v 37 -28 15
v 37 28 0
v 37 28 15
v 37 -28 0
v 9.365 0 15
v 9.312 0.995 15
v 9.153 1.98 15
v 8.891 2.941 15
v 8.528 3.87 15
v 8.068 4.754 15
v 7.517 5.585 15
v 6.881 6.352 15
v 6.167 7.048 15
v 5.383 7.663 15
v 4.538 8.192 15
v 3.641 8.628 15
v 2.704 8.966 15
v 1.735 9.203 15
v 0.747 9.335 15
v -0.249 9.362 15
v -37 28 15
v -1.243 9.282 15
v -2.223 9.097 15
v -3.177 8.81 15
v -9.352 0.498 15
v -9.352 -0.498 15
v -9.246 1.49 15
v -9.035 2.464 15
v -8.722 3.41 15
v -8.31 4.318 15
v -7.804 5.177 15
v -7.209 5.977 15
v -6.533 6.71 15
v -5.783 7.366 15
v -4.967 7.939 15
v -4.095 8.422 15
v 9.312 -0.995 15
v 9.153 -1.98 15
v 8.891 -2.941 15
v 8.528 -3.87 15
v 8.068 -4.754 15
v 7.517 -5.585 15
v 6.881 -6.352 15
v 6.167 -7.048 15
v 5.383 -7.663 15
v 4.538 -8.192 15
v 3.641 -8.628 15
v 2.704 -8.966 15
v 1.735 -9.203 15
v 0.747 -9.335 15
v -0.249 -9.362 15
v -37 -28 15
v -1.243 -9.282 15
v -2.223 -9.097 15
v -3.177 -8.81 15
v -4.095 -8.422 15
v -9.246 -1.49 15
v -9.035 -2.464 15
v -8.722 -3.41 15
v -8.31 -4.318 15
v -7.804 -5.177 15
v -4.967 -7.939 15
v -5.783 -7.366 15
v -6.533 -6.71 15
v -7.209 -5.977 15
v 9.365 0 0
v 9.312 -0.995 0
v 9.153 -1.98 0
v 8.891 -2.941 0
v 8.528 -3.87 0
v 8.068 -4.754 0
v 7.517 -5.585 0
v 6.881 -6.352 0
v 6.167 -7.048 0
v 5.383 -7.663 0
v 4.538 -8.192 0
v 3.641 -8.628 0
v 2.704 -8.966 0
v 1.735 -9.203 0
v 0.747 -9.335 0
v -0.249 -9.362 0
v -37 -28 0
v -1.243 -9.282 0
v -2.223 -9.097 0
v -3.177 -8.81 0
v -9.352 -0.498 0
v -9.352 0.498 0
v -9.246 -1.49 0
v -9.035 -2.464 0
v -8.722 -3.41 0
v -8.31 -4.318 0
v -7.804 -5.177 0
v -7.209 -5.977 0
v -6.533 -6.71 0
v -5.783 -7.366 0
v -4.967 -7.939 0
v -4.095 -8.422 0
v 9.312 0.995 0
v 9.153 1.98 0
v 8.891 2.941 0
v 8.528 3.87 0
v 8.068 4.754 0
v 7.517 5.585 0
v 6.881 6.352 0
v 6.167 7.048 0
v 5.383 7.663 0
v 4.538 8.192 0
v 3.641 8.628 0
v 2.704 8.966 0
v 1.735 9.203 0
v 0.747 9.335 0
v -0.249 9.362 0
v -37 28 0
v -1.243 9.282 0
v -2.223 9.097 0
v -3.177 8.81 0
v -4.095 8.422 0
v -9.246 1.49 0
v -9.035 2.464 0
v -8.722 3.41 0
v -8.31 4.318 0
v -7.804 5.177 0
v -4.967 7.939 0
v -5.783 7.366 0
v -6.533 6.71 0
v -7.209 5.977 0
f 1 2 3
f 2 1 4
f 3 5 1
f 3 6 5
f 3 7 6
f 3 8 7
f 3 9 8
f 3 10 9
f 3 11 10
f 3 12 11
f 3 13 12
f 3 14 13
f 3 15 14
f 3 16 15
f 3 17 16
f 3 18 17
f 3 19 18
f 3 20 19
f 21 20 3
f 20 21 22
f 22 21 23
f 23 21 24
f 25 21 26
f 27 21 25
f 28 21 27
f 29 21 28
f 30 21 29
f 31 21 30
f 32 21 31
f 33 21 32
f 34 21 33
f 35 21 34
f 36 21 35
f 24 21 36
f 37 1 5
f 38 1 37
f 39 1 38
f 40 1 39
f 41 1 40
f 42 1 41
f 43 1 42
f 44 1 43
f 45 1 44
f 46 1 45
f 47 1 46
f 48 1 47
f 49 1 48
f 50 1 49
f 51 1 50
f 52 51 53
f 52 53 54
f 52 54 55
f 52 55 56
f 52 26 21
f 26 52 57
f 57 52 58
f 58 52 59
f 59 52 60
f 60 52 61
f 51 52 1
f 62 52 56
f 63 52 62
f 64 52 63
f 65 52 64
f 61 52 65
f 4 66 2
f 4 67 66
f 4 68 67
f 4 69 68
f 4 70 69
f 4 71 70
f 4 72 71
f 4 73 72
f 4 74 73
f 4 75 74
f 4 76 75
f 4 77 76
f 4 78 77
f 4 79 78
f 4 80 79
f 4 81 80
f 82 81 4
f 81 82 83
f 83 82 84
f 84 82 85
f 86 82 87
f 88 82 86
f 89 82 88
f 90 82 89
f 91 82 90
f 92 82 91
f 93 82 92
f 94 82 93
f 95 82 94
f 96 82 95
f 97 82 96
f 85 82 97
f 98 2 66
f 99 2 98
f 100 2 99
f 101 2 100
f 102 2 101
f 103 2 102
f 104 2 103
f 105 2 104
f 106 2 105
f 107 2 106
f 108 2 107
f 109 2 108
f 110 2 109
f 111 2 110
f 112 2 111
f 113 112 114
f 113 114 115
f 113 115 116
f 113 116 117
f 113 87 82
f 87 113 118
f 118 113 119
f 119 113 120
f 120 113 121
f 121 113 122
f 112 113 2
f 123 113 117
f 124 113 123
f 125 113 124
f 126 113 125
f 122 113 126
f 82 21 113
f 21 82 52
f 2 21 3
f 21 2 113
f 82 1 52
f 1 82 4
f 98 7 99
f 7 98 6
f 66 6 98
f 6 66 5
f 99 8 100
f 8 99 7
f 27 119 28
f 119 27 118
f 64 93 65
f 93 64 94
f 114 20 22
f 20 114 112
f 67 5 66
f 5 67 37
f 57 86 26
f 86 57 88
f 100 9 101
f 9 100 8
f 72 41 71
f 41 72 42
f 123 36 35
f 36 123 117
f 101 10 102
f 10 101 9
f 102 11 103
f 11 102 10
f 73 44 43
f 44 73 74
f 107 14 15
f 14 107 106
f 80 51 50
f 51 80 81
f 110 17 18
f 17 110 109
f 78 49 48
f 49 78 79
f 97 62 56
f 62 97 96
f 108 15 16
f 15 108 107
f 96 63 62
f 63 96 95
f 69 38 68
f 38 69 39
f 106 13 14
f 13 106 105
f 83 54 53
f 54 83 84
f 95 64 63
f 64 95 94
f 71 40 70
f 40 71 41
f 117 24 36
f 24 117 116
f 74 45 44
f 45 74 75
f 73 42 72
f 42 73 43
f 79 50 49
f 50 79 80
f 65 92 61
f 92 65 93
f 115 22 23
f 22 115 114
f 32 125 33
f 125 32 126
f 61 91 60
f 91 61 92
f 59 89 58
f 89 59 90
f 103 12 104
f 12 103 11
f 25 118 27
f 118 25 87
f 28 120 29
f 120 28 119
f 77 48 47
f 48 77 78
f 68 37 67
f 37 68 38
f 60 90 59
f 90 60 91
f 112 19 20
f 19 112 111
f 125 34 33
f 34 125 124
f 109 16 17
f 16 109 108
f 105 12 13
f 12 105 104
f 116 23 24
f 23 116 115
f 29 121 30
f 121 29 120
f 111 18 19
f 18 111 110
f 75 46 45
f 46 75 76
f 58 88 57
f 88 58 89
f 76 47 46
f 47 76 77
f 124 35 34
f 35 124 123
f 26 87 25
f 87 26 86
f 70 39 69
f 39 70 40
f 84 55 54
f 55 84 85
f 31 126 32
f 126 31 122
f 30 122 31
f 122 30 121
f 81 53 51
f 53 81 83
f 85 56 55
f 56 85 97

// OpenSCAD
// all measurements are in millimeters
// this is the 3D print design of the Casting mechanism. It will be precisely the resonator size.
//I have not accounted for shrinking, these are the specified dimentions.

Resonator_diameter = 18.73;
Resonator_height = 15.0;
Caster_length = 74;
Caster_width = 56;
 
    difference()
    {   
    translate([0,0,Resonator_height/2])
    cube([Caster_length,Caster_width,Resonator_height],true);   
    cylinder(d = Resonator_diameter, h = Resonator_height, $fs = 1,$fa  = 1);  
    }
